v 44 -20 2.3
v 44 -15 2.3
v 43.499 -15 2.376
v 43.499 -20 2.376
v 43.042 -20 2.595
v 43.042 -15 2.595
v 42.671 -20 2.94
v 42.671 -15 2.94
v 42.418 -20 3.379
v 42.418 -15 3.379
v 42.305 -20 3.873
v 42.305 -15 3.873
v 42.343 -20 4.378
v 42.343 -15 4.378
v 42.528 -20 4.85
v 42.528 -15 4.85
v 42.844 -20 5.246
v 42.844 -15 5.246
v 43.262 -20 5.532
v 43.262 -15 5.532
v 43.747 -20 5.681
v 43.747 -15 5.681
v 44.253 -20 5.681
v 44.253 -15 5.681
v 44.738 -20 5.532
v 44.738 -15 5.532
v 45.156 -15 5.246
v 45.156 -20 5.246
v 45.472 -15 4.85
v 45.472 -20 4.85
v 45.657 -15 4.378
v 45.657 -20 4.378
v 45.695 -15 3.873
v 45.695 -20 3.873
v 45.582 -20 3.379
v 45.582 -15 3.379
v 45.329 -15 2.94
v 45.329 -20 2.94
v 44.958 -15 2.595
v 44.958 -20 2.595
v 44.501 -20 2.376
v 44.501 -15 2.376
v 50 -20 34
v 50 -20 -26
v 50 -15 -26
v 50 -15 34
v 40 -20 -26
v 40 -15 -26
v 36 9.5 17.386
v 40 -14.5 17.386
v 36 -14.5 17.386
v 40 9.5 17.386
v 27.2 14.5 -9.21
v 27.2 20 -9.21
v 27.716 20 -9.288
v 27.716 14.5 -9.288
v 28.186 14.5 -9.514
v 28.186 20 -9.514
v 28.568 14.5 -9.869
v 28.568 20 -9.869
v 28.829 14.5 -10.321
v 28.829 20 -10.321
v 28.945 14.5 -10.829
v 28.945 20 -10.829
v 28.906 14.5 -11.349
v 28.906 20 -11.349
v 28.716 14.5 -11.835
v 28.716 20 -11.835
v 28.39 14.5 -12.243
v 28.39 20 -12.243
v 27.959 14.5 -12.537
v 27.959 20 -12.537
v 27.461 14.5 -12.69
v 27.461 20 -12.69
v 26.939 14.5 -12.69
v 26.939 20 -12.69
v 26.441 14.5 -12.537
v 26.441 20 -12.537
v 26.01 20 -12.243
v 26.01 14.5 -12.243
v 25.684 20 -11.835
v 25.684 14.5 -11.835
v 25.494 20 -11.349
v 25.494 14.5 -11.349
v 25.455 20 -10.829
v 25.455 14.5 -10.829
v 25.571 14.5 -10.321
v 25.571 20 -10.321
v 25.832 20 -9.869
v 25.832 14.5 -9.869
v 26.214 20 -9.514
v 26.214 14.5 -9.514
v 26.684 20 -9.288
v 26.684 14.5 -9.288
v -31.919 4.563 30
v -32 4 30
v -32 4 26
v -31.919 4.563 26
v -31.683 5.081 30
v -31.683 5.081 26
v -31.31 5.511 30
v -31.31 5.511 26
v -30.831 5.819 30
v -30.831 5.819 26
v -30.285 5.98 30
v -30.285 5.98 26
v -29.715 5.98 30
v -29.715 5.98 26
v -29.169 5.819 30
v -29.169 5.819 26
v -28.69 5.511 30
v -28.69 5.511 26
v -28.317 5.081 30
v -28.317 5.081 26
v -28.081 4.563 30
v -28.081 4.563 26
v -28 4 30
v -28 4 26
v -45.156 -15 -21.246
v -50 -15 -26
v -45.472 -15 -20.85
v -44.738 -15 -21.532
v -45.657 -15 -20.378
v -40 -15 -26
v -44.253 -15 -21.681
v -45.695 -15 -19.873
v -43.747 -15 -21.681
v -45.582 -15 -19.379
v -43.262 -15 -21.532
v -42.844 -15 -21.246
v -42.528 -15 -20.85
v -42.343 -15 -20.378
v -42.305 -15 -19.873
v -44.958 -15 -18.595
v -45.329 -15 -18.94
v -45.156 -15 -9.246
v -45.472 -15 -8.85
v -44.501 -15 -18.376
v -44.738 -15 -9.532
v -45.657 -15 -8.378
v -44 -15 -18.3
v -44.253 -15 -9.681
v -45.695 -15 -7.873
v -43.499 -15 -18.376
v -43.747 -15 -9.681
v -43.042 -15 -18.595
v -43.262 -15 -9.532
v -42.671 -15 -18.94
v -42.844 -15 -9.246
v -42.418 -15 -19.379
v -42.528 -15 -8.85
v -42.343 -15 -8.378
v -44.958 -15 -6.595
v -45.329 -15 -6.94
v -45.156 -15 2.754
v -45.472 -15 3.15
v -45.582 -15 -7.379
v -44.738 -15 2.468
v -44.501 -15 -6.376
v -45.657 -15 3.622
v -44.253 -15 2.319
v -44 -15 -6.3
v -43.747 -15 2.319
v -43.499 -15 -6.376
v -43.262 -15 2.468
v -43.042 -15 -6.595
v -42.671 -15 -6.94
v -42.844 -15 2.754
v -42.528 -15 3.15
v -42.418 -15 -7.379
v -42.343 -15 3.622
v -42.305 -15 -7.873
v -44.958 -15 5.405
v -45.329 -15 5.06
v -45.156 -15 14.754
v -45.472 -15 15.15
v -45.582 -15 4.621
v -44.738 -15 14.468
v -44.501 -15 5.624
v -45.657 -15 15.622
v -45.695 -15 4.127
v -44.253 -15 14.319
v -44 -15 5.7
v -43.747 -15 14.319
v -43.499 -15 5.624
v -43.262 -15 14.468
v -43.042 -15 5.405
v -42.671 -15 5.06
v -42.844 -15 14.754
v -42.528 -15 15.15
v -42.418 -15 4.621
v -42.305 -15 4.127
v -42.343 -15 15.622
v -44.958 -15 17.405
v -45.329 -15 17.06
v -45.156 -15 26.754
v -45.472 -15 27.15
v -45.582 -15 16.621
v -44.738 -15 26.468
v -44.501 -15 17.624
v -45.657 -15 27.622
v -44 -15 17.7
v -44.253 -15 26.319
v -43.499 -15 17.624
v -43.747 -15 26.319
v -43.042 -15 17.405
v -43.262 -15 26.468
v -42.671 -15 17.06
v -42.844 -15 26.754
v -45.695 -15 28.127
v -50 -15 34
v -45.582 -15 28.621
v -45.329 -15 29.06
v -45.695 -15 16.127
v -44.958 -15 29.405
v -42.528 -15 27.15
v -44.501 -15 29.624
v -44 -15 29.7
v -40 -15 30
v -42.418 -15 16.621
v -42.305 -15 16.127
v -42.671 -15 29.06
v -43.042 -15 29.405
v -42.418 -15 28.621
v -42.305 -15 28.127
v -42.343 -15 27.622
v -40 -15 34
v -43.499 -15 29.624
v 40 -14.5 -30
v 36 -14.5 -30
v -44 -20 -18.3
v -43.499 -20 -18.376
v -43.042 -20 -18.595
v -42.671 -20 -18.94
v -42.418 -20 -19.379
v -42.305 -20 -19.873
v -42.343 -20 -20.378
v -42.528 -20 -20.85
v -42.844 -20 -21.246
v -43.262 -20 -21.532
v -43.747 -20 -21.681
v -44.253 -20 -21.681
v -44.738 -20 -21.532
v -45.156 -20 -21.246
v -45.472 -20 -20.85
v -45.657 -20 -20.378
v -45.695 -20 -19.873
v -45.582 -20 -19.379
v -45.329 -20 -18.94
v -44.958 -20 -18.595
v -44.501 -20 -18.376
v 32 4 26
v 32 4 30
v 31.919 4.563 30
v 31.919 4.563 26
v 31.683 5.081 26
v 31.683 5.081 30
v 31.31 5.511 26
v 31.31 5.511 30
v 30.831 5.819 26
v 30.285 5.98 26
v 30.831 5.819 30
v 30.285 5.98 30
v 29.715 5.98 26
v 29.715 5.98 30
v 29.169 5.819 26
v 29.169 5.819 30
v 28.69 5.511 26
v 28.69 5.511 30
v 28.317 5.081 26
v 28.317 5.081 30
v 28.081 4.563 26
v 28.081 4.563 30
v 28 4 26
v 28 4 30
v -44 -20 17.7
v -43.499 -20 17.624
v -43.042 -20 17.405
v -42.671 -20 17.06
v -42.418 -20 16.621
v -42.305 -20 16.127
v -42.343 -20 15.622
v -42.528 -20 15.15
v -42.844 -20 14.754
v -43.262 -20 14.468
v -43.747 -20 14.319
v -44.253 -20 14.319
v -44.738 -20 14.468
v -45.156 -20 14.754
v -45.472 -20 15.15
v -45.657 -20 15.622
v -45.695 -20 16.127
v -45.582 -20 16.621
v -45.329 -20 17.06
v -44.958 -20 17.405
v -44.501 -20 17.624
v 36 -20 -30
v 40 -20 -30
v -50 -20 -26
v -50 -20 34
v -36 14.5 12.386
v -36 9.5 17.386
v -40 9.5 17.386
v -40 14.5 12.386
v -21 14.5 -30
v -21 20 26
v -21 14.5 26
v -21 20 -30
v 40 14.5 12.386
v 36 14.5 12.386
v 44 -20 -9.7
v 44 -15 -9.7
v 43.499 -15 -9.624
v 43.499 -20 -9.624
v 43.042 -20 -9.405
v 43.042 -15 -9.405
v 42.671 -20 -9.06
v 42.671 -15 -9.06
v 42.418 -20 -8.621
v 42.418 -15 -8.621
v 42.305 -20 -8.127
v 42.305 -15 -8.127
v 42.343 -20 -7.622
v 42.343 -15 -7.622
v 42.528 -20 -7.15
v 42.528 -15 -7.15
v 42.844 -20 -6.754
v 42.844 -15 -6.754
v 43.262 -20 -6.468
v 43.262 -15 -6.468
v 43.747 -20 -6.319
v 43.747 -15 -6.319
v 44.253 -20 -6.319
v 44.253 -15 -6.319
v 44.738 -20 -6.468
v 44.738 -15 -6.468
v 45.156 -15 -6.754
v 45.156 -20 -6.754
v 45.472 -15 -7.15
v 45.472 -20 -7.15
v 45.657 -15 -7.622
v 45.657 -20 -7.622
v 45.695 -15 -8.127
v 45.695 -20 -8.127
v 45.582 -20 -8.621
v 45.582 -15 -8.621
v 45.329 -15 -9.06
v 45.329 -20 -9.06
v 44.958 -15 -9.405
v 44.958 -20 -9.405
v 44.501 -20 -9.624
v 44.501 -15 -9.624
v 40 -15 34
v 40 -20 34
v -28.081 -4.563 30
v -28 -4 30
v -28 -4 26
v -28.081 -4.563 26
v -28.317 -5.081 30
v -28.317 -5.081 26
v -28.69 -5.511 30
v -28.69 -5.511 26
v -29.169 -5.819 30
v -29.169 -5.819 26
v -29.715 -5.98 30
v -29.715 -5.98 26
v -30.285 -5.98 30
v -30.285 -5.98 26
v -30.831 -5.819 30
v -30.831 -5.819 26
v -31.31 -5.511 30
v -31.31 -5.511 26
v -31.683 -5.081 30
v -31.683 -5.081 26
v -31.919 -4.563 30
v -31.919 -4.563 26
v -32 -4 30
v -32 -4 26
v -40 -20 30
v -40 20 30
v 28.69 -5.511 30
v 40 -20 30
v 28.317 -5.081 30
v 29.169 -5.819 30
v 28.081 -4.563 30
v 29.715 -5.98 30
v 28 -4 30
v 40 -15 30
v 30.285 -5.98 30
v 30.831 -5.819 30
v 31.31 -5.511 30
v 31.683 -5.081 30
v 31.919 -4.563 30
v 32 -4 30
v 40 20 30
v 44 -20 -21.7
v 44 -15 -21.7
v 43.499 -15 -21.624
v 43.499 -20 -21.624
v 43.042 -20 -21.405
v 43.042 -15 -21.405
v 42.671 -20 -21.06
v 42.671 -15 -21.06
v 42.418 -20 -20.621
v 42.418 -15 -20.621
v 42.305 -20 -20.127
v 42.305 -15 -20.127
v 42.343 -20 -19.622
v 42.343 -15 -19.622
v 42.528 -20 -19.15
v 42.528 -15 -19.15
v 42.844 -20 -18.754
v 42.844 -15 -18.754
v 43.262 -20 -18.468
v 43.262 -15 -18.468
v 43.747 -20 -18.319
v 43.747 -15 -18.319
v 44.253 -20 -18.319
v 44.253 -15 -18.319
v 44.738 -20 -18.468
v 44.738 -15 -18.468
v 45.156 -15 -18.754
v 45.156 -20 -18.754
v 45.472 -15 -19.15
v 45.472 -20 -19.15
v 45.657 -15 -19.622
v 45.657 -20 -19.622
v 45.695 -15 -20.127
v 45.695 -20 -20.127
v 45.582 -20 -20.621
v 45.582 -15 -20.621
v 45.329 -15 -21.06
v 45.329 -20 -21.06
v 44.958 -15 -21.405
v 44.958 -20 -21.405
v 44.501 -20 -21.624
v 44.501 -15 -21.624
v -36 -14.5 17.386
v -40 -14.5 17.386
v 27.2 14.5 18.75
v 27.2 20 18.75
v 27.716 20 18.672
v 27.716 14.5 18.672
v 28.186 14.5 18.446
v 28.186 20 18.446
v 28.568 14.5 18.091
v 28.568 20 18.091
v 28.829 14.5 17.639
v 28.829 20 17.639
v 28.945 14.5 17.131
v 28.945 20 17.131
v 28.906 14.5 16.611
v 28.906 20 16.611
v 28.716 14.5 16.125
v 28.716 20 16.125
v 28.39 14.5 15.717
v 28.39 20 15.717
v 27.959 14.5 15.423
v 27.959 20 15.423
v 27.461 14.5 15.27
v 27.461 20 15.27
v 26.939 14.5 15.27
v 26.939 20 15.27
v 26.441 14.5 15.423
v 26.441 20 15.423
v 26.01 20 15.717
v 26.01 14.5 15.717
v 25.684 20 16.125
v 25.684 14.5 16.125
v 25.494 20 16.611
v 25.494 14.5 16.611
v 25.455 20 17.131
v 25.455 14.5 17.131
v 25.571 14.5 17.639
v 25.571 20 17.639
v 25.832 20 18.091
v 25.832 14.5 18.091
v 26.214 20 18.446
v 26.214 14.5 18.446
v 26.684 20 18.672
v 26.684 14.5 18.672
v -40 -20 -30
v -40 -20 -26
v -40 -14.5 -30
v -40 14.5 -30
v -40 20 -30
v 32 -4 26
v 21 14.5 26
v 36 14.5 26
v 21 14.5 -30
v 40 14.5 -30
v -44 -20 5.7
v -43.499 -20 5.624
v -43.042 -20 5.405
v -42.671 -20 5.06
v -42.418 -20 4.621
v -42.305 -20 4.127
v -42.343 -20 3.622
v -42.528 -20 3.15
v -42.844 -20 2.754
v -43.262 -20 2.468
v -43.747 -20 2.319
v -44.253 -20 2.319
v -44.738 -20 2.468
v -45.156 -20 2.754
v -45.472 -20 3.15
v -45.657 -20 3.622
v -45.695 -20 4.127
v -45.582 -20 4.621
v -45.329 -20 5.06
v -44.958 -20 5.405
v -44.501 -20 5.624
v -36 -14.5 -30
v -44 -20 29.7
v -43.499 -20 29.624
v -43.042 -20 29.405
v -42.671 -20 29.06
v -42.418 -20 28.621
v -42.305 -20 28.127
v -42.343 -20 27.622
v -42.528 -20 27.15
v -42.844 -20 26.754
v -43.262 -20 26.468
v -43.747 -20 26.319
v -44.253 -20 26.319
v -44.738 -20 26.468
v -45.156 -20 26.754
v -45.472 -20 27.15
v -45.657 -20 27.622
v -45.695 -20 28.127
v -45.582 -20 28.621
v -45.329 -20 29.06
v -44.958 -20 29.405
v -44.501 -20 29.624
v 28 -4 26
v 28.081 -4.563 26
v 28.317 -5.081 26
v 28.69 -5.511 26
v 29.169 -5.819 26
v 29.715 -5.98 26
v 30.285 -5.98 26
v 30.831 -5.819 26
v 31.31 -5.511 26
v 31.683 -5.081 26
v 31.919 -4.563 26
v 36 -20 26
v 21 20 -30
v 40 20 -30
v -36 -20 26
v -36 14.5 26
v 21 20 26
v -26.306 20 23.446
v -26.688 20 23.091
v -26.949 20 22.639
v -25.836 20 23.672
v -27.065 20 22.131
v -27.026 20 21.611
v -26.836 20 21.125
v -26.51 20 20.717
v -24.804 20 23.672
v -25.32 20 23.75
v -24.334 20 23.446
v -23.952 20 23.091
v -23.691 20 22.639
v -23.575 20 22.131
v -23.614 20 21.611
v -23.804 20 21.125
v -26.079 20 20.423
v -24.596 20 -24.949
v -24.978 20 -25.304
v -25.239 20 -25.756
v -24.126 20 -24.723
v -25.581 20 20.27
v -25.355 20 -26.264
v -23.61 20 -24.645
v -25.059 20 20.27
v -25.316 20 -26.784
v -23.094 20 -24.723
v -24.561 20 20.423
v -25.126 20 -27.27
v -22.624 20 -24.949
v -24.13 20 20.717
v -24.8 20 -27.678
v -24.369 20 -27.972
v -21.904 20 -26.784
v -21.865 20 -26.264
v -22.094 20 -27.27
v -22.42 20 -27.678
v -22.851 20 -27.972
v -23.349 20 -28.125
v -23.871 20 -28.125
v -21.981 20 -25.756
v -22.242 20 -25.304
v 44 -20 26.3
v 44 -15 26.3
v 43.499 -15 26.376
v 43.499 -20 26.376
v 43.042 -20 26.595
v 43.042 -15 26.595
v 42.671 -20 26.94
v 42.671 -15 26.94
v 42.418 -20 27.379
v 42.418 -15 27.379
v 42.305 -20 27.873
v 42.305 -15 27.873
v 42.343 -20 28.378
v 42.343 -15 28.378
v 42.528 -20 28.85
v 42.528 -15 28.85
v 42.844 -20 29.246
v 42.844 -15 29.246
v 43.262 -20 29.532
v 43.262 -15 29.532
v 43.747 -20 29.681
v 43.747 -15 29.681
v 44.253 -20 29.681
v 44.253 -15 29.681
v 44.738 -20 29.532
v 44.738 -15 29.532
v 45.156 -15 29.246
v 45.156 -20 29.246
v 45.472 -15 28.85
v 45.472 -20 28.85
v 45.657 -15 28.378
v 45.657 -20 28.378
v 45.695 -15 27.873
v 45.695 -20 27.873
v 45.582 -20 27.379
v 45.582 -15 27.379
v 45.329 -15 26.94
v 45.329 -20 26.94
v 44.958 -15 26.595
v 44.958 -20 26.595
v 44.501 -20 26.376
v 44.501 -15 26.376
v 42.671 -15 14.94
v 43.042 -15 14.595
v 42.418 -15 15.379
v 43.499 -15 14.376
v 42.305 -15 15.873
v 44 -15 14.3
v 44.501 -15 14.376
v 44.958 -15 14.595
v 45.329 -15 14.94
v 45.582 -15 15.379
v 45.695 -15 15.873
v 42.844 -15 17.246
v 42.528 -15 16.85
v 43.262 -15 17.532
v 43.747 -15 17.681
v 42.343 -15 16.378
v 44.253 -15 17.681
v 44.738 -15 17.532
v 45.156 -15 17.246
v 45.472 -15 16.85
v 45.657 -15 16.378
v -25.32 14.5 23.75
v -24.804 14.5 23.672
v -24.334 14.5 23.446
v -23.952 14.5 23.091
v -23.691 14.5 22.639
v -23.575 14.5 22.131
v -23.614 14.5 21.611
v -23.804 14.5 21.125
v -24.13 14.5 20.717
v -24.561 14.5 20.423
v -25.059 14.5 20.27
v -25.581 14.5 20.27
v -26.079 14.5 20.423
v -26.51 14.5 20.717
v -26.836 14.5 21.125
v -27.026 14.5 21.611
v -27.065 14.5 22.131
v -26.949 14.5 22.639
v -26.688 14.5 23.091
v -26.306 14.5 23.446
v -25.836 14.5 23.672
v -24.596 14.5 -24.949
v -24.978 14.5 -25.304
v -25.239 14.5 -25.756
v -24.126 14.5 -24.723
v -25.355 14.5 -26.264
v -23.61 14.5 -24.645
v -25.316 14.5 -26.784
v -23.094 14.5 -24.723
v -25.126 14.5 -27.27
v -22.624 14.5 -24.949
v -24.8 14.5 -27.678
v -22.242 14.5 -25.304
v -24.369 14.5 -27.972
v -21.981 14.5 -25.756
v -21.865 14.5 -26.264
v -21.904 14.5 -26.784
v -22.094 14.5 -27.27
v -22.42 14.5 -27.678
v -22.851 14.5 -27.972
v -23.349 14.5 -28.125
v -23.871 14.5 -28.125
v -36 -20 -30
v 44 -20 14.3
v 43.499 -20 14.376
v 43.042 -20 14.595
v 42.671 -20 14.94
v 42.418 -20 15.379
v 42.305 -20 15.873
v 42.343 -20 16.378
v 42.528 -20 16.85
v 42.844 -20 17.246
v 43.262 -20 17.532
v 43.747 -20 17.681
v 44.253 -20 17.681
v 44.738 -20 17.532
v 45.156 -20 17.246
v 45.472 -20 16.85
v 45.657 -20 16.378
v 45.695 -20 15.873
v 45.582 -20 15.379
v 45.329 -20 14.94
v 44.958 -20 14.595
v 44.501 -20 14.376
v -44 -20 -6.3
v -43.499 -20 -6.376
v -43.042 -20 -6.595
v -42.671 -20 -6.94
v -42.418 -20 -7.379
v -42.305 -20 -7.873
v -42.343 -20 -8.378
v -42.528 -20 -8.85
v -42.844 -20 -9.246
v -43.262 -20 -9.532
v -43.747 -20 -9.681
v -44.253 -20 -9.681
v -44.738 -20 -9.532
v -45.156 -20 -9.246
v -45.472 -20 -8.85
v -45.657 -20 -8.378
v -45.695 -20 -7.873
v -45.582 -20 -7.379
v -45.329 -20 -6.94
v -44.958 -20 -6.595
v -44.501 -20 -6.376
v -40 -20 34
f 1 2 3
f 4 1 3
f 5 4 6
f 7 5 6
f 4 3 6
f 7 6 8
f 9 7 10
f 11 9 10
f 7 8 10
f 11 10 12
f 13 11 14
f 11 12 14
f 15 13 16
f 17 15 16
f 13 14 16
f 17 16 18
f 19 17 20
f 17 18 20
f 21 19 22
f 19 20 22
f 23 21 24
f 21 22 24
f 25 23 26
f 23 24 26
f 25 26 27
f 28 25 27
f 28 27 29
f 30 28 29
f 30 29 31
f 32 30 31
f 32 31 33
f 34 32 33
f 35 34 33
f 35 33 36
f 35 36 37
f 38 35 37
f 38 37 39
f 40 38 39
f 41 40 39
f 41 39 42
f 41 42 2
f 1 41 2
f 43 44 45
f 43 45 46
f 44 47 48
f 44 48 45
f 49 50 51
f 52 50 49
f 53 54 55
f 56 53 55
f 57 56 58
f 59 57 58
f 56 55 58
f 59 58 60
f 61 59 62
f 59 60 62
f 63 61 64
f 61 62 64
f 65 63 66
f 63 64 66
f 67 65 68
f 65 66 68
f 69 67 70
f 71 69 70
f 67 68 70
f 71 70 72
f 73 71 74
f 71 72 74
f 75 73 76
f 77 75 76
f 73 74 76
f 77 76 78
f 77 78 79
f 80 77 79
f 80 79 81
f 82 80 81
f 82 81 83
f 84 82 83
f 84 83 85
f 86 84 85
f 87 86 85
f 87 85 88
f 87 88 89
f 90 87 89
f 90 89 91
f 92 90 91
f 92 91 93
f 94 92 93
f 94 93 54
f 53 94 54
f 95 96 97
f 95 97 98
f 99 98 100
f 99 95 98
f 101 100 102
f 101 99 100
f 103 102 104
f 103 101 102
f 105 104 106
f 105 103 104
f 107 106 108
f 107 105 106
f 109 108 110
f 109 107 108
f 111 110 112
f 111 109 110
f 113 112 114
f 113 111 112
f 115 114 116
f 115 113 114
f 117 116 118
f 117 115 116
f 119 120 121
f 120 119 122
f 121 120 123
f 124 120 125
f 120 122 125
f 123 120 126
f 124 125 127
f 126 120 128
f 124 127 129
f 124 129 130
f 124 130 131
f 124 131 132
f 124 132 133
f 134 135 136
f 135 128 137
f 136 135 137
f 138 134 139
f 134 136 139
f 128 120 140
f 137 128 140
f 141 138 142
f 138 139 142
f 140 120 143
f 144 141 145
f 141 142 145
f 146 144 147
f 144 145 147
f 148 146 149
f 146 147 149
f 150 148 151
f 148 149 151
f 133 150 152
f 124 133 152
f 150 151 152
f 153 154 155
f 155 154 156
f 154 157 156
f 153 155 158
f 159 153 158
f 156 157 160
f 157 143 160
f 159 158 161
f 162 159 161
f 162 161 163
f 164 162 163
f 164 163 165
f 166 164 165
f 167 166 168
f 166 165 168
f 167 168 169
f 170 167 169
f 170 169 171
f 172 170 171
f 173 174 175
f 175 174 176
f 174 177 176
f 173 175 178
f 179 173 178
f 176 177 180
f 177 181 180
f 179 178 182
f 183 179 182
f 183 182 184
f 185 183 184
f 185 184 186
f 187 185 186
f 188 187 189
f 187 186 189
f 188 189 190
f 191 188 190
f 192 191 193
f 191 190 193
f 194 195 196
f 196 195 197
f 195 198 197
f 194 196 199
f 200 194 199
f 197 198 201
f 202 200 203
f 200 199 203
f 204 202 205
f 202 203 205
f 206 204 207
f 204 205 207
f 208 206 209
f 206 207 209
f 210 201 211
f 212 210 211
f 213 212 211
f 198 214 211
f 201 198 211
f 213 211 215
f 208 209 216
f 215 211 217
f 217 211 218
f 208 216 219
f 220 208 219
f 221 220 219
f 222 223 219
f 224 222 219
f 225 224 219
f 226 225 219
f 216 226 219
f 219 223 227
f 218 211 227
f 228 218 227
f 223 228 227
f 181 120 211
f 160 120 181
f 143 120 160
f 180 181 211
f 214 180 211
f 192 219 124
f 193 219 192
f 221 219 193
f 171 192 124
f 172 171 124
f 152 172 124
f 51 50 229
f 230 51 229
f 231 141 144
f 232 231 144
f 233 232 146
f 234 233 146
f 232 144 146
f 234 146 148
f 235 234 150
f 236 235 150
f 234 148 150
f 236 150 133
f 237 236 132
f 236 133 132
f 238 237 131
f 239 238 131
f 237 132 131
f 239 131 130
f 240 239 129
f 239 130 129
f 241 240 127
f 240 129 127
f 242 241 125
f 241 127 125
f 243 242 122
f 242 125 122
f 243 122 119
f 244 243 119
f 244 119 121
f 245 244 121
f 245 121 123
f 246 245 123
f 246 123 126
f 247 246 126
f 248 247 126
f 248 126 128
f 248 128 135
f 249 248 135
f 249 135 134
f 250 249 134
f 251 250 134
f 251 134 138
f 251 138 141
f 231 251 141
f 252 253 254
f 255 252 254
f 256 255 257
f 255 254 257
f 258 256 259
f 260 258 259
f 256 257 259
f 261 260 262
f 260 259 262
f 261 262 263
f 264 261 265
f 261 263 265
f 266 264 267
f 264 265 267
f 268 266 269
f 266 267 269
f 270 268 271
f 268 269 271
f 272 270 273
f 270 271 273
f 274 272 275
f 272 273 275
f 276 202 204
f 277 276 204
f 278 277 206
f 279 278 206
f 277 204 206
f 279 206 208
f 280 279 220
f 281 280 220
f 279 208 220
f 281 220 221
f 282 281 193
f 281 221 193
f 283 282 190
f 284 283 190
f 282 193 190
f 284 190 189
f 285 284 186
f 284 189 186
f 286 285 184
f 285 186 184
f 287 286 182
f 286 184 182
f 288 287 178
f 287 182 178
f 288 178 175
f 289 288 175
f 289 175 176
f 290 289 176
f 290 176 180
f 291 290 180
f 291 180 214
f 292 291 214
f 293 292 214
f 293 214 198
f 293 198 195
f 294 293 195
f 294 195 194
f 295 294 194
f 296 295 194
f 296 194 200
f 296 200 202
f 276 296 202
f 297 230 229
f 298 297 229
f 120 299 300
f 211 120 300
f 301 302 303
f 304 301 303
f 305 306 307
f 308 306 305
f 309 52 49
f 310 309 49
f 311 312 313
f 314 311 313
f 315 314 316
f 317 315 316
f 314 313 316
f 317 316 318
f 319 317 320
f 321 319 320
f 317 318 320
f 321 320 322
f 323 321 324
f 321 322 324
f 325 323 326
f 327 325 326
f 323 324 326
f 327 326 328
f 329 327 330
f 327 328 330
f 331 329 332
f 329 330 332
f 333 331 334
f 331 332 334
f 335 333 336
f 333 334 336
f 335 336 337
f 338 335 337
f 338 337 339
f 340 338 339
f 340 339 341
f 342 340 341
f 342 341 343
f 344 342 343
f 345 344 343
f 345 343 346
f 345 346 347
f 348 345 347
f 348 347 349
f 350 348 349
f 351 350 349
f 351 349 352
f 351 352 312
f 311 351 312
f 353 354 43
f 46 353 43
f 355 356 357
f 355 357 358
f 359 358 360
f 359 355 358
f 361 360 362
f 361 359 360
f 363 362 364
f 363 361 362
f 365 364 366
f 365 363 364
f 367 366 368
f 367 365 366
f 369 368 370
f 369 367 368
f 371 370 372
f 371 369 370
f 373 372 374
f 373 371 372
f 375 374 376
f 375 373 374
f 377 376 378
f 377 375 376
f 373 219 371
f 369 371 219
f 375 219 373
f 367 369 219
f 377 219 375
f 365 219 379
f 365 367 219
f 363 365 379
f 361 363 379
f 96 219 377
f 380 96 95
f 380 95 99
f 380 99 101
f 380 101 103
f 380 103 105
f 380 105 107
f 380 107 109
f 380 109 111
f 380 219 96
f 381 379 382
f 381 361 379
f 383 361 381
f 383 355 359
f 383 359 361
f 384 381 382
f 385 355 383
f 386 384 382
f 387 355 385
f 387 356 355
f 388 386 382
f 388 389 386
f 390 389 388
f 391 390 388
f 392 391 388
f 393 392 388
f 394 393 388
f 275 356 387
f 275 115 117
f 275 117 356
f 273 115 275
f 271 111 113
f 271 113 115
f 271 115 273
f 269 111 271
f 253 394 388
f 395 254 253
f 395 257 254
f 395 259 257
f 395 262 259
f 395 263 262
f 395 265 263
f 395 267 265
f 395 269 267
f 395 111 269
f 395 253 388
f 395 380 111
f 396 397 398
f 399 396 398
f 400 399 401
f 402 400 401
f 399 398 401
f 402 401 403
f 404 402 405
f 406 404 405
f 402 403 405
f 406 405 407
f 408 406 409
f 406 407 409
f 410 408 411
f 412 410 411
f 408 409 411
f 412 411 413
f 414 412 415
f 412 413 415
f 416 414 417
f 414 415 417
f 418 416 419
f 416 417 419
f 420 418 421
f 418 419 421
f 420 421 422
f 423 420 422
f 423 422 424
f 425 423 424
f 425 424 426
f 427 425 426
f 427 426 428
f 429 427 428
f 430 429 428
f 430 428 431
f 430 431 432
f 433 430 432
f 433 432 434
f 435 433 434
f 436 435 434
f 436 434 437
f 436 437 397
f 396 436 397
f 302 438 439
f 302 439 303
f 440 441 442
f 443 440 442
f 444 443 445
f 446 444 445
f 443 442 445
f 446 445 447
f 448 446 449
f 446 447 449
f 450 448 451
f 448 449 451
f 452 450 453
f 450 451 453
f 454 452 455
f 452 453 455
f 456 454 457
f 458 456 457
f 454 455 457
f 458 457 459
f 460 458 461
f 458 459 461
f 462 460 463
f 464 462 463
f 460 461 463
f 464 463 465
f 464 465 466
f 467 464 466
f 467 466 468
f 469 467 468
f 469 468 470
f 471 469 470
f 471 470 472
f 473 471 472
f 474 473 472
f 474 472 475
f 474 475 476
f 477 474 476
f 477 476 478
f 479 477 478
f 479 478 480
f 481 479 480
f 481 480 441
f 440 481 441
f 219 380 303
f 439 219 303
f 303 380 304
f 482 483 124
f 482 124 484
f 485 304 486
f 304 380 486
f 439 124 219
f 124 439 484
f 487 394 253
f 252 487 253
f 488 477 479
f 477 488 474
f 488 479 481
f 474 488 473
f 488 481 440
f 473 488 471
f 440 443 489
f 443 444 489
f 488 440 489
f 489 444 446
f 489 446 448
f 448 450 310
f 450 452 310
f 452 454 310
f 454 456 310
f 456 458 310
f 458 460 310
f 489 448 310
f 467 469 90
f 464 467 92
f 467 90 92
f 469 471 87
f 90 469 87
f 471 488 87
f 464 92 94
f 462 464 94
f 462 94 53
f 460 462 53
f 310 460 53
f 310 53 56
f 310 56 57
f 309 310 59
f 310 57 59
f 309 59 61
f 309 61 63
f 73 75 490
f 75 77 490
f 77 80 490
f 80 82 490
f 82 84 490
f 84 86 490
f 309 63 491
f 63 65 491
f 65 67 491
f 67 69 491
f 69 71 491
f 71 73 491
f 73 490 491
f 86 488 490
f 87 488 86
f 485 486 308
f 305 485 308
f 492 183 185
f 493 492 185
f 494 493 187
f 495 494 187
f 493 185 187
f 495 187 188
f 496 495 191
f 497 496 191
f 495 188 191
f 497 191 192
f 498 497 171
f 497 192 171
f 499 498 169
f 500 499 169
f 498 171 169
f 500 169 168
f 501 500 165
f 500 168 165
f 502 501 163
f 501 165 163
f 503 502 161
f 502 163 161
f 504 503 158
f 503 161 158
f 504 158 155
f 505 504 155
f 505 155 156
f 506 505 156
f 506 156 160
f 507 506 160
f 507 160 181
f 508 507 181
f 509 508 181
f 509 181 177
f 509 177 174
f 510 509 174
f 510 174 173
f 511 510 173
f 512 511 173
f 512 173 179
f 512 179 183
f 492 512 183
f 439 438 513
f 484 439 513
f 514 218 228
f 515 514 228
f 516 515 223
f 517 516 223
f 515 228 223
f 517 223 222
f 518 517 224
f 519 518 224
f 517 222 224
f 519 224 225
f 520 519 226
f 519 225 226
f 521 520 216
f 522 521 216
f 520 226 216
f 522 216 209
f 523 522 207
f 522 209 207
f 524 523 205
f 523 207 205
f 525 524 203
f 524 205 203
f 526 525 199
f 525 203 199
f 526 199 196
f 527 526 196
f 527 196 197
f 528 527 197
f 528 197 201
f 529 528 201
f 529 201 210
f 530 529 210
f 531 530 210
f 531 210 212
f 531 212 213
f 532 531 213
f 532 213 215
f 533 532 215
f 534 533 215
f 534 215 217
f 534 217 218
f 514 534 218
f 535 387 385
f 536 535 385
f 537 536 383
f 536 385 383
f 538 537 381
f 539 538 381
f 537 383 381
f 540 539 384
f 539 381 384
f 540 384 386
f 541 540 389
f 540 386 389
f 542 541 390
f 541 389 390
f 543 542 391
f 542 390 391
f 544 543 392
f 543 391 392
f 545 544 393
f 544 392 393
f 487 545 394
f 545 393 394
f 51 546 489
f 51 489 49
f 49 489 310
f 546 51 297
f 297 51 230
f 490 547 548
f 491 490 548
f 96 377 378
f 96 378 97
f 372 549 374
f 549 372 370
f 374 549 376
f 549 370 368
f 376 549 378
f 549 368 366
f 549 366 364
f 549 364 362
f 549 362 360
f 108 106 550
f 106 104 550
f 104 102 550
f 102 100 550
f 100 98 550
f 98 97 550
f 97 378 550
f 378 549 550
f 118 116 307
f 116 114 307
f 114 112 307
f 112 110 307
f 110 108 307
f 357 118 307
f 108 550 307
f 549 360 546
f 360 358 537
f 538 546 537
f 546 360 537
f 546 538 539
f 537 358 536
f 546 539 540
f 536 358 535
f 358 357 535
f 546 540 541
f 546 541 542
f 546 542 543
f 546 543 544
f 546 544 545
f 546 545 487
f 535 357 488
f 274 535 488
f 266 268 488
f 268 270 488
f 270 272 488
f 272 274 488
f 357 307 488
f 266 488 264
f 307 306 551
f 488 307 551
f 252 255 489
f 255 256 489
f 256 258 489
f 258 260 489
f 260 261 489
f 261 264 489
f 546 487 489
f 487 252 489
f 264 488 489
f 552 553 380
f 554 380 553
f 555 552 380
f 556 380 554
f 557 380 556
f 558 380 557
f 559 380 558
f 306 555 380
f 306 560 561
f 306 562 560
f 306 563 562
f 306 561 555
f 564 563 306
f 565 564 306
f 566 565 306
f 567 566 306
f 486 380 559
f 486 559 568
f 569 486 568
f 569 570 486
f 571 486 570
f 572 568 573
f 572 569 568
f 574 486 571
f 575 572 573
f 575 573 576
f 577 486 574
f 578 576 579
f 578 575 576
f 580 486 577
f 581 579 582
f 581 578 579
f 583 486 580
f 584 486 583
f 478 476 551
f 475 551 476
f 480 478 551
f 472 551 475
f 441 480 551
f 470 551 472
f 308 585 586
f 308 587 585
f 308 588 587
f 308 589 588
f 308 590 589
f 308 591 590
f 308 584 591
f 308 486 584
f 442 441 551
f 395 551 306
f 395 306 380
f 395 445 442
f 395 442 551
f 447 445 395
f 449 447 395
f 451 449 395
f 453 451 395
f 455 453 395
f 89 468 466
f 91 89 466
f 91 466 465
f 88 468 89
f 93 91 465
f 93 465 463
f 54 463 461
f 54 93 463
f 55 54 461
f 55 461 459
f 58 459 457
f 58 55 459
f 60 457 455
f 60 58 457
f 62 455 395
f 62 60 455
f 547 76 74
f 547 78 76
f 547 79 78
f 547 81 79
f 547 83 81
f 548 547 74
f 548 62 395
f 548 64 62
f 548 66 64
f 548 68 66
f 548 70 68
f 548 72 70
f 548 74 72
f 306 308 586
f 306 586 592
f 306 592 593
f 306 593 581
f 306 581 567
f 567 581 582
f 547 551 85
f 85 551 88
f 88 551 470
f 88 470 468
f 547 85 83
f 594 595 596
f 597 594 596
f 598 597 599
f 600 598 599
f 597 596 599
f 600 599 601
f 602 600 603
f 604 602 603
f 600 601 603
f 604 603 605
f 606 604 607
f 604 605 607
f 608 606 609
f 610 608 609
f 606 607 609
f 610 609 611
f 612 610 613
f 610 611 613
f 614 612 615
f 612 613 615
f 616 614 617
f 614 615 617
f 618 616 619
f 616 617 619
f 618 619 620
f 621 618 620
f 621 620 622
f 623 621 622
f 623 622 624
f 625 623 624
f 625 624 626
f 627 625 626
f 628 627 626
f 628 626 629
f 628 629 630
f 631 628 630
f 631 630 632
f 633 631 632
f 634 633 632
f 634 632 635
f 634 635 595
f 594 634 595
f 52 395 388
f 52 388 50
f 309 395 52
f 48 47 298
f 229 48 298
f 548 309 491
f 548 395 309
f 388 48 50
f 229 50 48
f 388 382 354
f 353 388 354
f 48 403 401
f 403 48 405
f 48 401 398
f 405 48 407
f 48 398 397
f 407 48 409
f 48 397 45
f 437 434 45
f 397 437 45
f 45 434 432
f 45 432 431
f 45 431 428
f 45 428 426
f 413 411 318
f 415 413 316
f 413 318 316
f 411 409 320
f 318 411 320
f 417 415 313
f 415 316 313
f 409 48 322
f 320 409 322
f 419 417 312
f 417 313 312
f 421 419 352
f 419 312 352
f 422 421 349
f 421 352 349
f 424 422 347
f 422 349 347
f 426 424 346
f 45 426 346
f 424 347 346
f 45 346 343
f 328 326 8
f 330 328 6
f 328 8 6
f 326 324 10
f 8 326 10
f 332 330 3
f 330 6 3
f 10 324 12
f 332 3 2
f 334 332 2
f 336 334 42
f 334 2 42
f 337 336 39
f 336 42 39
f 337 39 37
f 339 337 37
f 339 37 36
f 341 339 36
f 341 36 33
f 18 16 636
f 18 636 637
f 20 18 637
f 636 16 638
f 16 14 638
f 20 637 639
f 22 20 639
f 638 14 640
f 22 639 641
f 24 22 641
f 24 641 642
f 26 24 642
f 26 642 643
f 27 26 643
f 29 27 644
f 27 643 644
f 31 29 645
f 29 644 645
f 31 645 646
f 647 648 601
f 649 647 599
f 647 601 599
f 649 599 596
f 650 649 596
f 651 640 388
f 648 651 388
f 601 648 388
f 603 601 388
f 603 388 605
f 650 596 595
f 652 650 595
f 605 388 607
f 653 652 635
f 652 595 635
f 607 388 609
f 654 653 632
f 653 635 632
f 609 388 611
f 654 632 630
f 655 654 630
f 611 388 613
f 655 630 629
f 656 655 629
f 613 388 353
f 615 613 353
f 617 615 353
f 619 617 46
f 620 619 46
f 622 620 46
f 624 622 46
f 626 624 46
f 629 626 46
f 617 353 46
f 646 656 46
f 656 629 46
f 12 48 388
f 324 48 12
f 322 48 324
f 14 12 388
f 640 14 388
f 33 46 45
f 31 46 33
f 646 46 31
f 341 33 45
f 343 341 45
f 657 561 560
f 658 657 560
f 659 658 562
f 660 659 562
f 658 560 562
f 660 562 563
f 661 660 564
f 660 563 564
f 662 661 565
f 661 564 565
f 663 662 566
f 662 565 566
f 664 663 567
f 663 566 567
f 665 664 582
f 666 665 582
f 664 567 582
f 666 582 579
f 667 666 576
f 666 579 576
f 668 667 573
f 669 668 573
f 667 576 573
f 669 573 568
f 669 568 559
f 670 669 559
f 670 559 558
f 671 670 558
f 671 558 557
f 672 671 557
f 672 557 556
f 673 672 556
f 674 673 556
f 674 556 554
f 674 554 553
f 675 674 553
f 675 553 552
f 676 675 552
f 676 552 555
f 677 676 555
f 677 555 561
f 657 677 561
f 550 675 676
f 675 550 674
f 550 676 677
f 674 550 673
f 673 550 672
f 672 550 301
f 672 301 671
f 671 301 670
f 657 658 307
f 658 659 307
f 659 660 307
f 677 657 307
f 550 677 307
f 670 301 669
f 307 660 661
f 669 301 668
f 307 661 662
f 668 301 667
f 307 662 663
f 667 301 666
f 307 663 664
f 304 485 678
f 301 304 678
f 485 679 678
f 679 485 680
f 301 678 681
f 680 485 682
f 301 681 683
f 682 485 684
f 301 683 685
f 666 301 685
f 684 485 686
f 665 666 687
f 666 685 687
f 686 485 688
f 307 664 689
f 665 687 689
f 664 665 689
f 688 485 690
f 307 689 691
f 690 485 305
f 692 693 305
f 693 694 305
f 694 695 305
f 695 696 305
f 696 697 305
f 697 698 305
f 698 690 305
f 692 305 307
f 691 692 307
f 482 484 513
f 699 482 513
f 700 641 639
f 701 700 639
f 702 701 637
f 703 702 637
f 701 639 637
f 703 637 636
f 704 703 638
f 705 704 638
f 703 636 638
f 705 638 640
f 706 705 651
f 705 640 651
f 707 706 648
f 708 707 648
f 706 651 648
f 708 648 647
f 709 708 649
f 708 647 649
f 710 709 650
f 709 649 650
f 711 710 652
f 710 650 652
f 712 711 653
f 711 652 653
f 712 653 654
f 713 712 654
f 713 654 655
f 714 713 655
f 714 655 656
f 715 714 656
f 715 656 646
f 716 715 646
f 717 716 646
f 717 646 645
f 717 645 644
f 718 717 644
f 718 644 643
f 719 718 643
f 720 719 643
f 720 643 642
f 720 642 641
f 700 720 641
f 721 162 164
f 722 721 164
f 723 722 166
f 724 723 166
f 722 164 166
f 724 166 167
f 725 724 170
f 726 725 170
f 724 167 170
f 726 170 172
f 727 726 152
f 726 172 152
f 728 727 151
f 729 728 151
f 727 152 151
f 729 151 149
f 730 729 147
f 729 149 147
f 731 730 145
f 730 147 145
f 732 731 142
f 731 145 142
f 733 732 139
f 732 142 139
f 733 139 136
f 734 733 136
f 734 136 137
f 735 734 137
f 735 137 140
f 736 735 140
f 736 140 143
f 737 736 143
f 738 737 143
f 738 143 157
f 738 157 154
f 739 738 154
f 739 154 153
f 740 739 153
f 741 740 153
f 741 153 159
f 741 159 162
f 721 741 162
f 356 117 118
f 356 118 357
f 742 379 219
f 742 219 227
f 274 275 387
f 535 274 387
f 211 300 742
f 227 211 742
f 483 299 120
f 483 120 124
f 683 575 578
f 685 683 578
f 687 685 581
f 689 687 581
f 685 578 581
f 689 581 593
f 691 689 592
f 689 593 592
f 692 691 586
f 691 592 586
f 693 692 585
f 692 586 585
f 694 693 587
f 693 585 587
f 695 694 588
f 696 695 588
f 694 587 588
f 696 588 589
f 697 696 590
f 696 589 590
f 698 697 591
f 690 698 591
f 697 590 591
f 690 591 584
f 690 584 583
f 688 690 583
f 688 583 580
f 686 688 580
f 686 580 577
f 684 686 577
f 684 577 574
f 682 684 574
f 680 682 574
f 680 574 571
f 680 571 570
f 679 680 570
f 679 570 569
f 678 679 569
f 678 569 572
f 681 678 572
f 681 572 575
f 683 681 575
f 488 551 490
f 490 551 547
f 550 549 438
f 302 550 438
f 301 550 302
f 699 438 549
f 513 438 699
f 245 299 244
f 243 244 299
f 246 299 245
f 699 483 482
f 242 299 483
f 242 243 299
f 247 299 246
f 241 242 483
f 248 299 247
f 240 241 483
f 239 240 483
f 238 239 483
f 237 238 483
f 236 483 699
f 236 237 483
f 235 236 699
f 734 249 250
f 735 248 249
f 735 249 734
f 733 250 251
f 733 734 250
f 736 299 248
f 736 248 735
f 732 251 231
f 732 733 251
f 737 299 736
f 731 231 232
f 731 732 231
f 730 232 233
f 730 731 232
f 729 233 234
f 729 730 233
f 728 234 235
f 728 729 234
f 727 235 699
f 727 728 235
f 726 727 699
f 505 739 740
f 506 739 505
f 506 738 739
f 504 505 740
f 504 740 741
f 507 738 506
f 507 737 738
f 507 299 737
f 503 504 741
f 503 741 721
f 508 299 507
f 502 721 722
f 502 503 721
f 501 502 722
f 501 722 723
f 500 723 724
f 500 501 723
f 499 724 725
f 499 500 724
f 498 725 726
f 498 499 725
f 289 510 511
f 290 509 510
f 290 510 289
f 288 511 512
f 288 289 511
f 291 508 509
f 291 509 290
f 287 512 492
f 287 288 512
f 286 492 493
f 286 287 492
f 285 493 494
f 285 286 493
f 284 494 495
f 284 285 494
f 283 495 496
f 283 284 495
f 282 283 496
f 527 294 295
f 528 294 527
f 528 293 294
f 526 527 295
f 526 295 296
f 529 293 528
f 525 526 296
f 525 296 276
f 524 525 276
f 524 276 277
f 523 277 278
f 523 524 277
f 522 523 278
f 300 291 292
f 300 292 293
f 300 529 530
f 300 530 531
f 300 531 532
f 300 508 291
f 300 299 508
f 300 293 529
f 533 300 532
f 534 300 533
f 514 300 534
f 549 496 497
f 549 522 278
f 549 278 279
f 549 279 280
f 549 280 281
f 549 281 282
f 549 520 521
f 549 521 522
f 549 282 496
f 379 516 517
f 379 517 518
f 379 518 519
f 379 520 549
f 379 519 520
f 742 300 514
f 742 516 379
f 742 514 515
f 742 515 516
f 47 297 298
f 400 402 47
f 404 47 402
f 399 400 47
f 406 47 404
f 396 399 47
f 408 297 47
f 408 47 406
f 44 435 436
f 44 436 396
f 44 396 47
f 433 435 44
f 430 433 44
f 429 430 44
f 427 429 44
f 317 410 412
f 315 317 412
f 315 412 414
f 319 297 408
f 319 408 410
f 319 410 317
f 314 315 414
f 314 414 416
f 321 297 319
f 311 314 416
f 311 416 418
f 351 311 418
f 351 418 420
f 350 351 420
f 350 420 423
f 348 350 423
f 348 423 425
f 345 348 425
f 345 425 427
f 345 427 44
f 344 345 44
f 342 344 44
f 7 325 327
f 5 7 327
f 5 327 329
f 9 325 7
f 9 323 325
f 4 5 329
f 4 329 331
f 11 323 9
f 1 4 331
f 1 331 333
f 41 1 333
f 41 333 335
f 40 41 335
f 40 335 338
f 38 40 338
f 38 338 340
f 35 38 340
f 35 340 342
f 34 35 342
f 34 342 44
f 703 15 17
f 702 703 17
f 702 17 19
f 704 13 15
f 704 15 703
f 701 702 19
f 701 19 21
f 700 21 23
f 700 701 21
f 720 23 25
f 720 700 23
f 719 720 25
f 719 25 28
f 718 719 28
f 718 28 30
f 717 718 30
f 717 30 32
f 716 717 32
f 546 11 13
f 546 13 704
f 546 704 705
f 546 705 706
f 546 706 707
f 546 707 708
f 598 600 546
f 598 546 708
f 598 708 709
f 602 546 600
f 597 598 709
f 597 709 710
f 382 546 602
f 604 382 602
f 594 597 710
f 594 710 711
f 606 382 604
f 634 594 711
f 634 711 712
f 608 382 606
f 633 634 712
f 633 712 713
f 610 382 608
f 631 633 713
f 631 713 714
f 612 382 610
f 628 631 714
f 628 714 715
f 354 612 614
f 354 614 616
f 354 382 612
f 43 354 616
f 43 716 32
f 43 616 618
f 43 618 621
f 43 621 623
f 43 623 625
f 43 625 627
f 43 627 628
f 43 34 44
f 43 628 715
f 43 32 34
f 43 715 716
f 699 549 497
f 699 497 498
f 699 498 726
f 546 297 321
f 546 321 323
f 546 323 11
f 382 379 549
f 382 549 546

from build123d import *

# Parameters (mm, degrees)
SKETCH_1_W          = 80
SKETCH_1_H          = 60
EXTRUDE_1_DEPTH     = 20
SKETCH_2_W          = 72
SKETCH_2_H          = 56
CUT_EXTRUDE_1_DEPTH = 70
SKETCH_3_W          = 47.385697094
SKETCH_3_H          = 29
CUT_EXTRUDE_2_DEPTH = 80
SKETCH_4_W          = 10
SKETCH_4_H          = 60
EXTRUDE_2_DEPTH     = 5
SKETCH_5_R          = 1.7
CUT_EXTRUDE_3_DEPTH = 25
SKETCH_6_W          = 15
SKETCH_6_H          = 56
EXTRUDE_3_DEPTH     = 5.5
SKETCH_8_R          = 1.75
CUT_EXTRUDE_5_DEPTH = 10
CHAMFER_1_SIZE      = 5
CUT_EXTRUDE_8_DEPTH = 10


with BuildPart() as part:
    # 草图1 → 凸台-拉伸1 (new, symmetric)
    with BuildSketch(Plane(origin=(0, 0, 0), x_dir=(1, 0, 0), z_dir=(0, 1, 0))):
        Rectangle(SKETCH_1_W, SKETCH_1_H)
    extrude(amount=EXTRUDE_1_DEPTH, both=True)

    # 草图2 → 切除-拉伸1 (cut)
    with BuildSketch(Plane(origin=(0, 20, 0), x_dir=(1, 0, 0), z_dir=(0, 1, 0))):
        with Locations((0, 2)):
            Rectangle(SKETCH_2_W, SKETCH_2_H)
    extrude(amount=-CUT_EXTRUDE_1_DEPTH, mode=Mode.SUBTRACT)

    # 草图3 → 切除-拉伸2 (cut)
    with BuildSketch(Plane(origin=(40, 0, 0), x_dir=(0, 0, -1), z_dir=(1, 0, 0))):
        with Locations((6.307151453, 0)):
            Rectangle(SKETCH_3_W, SKETCH_3_H)
    extrude(amount=-CUT_EXTRUDE_2_DEPTH, mode=Mode.SUBTRACT)

    # 草图4 → 凸台-拉伸2 (add)
    with BuildSketch(Plane.XZ.offset(20)):
        with Locations((-45, 4)):
            Rectangle(SKETCH_4_W, SKETCH_4_H)
        with Locations((45, 4)):
            Rectangle(SKETCH_4_W, SKETCH_4_H)
    extrude(amount=-EXTRUDE_2_DEPTH)

    # 草图5 → 切除-拉伸3 (cut)
    with BuildSketch(Plane(origin=(0, -15, 0), x_dir=(1, 0, 0), z_dir=(0, 1, 0))):
        with Locations(Location((-44, 20, 0), (0, 0, 270))):
            Circle(SKETCH_5_R)
        with Locations(Location((-44, 8, 0), (0, 0, 270))):
            Circle(SKETCH_5_R)
        with Locations(Location((-44, -4, 0), (0, 0, 270))):
            Circle(SKETCH_5_R)
        with Locations(Location((-44, -16, 0), (0, 0, 270))):
            Circle(SKETCH_5_R)
        with Locations(Location((-44, -28, 0), (0, 0, 270))):
            Circle(SKETCH_5_R)
        with Locations(Location((44, -28, 0), (0, 0, 90))):
            Circle(SKETCH_5_R)
        with Locations(Location((44, -16, 0), (0, 0, 90))):
            Circle(SKETCH_5_R)
        with Locations(Location((44, -4, 0), (0, 0, 90))):
            Circle(SKETCH_5_R)
        with Locations(Location((44, 8, 0), (0, 0, 90))):
            Circle(SKETCH_5_R)
        with Locations(Location((44, 20, 0), (0, 0, 90))):
            Circle(SKETCH_5_R)
    extrude(amount=-CUT_EXTRUDE_3_DEPTH, mode=Mode.SUBTRACT)

    # 草图6 → 凸台-拉伸3 (add)
    with BuildSketch(Plane(origin=(0, 20, 0), x_dir=(1, 0, 0), z_dir=(0, 1, 0))):
        with Locations((-28.5, 2)):
            Rectangle(SKETCH_6_W, SKETCH_6_H)
        with Locations((28.5, 2)):
            Rectangle(SKETCH_6_W, SKETCH_6_H)
    extrude(amount=-EXTRUDE_3_DEPTH)

    # 草图8 → 切除-拉伸5 (cut)
    with BuildSketch(Plane(origin=(0, 20, 0), x_dir=(1, 0, 0), z_dir=(0, 1, 0))):
        with Locations(Location((-25.32, -22, 0), (0, 0, 270))):
            Circle(SKETCH_8_R)
        with Locations(Location((-23.61, 26.395, 0), (0, 0, 270))):
            Circle(SKETCH_8_R)
        with Locations(Location((27.2, 10.96, 0), (0, 0, 270))):
            Circle(SKETCH_8_R)
        with Locations(Location((27.2, -17, 0), (0, 0, 270))):
            Circle(SKETCH_8_R)
    extrude(amount=-CUT_EXTRUDE_5_DEPTH, mode=Mode.SUBTRACT)

    # 倒角1
    chamfer_1_edges = [part.edges().sort_by_distance(p)[0] for p in [
        (38, 14.5, 17.385697094),
        (-38, 14.5, 17.385697094),
    ]]
    chamfer(chamfer_1_edges, length=CHAMFER_1_SIZE)

    # 草图10 → 切除-拉伸8 (cut)
    with BuildSketch(Plane.XY.offset(30)):
        with BuildLine():
            Line((-28, 4), (-28, -4))
            ThreePointArc((-28, -4), (-30, -6), (-32, -4))
            Line((-32, -4), (-32, 4))
            ThreePointArc((-32, 4), (-30, 6), (-28, 4))
        make_face()
        with BuildLine():
            Line((28, 4), (28, -4))
            ThreePointArc((28, -4), (30, -6), (32, -4))
            Line((32, -4), (32, 4))
            ThreePointArc((32, 4), (30, 6), (28, 4))
        make_face()
    extrude(amount=-CUT_EXTRUDE_8_DEPTH, mode=Mode.SUBTRACT)


solid = part.part
